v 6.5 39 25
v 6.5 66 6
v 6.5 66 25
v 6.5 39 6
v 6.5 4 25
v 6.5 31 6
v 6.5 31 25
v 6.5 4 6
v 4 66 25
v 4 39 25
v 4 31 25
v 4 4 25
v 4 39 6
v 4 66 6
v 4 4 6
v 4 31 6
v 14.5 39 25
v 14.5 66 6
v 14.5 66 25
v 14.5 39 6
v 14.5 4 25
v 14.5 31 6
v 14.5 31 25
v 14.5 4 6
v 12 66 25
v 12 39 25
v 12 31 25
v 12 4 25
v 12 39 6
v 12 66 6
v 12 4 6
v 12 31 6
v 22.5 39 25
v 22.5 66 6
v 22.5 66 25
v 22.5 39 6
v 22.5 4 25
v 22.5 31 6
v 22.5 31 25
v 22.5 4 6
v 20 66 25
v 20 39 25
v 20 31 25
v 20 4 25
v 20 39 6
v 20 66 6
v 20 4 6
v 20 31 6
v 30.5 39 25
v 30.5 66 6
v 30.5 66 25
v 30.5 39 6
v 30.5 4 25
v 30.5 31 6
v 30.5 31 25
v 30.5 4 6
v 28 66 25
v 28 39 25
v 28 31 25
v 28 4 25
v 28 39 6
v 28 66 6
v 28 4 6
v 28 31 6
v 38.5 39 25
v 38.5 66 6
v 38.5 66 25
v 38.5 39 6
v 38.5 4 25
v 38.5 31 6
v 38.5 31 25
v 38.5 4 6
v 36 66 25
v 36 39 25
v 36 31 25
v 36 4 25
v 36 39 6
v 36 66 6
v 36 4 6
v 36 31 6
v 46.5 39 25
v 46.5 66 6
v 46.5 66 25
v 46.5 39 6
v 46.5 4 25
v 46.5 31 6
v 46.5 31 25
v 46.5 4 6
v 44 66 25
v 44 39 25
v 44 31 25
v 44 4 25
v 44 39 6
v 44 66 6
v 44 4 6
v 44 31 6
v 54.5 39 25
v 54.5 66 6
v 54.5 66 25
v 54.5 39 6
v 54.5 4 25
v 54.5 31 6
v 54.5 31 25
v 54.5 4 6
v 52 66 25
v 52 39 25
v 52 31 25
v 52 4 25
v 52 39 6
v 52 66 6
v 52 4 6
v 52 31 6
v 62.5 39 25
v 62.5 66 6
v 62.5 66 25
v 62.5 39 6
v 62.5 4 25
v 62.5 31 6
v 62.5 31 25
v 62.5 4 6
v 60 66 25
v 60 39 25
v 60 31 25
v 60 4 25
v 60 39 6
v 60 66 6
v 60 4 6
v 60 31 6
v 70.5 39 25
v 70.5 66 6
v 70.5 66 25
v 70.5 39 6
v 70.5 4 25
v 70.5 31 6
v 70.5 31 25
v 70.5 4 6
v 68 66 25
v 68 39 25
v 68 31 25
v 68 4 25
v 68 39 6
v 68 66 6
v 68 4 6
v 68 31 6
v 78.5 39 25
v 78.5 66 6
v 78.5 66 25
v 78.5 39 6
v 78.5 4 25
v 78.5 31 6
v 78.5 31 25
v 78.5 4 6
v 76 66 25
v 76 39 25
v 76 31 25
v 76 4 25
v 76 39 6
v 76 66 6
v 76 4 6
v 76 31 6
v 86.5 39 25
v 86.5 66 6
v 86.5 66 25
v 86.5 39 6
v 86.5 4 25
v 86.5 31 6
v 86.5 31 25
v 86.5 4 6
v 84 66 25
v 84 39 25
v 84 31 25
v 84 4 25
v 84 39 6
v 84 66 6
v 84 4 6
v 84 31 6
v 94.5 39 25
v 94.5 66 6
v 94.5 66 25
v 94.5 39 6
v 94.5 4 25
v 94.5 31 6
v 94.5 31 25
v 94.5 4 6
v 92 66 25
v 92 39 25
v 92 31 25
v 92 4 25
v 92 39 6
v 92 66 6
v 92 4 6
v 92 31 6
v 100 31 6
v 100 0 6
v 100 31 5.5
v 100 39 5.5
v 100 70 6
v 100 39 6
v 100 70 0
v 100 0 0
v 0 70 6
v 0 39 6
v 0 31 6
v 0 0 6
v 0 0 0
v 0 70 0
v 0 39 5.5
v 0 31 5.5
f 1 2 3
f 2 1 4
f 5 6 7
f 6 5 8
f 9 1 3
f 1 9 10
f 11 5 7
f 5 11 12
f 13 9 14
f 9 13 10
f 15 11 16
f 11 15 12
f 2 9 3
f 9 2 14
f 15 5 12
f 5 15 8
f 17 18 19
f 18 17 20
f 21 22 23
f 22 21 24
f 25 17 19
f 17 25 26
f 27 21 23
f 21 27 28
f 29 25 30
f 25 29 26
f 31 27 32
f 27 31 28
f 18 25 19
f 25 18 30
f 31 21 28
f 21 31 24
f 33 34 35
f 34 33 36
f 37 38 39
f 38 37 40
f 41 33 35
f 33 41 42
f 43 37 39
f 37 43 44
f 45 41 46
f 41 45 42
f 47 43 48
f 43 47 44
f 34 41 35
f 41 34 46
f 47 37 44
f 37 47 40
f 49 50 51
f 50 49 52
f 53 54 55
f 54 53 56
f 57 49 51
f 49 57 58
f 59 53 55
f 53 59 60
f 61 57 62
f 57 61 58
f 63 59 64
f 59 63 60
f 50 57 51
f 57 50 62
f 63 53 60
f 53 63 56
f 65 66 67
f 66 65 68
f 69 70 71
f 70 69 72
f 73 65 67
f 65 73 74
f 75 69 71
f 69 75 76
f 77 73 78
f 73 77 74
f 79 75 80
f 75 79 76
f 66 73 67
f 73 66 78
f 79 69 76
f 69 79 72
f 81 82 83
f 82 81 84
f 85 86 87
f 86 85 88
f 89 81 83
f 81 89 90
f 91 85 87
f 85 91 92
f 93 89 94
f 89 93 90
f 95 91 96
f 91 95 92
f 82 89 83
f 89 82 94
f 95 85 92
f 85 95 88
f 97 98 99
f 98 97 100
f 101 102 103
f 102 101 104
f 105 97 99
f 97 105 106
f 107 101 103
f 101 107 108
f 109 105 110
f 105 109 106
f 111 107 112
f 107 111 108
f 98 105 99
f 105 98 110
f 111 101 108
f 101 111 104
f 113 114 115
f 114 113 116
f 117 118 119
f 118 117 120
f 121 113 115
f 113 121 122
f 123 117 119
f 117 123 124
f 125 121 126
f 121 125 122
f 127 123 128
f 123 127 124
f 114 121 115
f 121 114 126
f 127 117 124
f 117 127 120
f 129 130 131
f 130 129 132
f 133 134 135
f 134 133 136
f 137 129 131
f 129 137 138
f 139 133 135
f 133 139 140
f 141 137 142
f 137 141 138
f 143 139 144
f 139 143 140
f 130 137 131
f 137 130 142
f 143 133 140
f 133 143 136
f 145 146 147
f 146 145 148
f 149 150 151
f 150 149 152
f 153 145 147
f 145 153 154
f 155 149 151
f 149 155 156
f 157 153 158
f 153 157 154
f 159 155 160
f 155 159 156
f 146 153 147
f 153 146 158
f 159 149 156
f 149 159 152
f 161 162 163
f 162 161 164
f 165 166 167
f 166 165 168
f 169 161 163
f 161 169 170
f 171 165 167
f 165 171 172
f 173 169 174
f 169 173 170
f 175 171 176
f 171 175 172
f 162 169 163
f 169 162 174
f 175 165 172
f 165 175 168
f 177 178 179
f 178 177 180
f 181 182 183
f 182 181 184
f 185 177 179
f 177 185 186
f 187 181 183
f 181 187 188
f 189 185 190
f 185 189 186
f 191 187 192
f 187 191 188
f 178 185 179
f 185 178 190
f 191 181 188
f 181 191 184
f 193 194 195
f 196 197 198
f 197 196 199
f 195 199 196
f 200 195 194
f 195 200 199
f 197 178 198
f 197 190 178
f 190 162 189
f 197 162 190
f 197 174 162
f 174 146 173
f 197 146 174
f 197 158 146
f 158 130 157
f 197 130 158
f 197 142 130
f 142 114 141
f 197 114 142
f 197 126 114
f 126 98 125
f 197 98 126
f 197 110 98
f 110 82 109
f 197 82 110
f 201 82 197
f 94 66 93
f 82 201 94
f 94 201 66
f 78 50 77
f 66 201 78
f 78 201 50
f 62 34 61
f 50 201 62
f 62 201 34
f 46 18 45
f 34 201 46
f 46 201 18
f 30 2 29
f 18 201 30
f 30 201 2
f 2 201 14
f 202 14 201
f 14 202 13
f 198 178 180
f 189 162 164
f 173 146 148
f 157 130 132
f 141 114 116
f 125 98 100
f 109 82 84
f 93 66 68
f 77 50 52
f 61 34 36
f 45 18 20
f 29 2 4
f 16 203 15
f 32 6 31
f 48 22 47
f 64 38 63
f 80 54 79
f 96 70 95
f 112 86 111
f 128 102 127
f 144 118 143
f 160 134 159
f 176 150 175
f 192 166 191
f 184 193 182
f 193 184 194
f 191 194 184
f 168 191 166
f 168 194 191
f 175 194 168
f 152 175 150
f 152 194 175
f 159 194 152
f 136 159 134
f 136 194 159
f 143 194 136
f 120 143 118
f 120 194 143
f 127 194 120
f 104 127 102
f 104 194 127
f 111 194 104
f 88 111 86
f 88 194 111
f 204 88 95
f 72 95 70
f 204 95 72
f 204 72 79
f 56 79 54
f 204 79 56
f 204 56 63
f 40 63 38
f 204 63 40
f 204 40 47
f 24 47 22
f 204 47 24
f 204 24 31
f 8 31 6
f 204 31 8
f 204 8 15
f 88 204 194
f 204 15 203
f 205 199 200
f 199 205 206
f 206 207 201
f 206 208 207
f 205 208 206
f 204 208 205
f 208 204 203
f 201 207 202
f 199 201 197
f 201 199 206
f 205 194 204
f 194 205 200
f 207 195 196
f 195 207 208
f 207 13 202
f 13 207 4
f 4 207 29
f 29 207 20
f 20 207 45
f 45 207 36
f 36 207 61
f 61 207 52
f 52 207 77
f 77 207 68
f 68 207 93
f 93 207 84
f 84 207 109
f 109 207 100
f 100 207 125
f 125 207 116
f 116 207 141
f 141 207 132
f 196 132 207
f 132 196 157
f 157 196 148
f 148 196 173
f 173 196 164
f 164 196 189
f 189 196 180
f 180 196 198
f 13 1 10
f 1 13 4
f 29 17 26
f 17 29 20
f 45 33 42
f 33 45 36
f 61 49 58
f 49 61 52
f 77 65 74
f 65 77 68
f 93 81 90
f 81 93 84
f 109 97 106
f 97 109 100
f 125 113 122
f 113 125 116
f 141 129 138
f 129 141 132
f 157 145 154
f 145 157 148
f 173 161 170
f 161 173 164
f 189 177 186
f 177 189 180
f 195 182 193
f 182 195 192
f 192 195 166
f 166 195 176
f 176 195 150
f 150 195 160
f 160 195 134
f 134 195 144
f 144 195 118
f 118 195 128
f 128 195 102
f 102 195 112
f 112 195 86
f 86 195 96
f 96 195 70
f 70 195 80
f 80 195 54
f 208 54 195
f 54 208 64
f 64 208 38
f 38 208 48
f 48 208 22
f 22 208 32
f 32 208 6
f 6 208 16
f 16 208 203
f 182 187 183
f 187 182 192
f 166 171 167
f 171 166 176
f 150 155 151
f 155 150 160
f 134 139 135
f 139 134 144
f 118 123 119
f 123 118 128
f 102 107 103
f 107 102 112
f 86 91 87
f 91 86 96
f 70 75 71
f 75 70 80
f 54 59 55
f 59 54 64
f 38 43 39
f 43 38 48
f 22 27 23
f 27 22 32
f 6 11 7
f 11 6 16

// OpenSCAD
$fn = 32;

// ----------------------------------------------------------------------
// Heatsink: slotted fin block
// ----------------------------------------------------------------------

// --- parameters (mm) ---
base_l = 100;             // base length, X
base_w = 70;              // base width, Y
base_t = 6;               // base plate thickness
fin_h = 20;               // fin height above the base
fin_t = 2.5;              // fin thickness
edge = 4;                 // margin from the base ends
pitch = 8;                // fin pitch
slot_w = 8;               // central slot width, Y

n_fins = floor((base_l - 2 * edge - fin_t) / pitch) + 1;  // fin count
total_h = base_t + fin_h - 1;  // overall height

difference() {
union() {
  cube([base_l, base_w, base_t]);
  for (i = [0 : n_fins - 1])
    translate([edge + i * pitch, edge, base_t - 1])
      cube([fin_t, base_w - 2 * edge, fin_h]);
}
  translate([-1, base_w / 2 - slot_w / 2, base_t - 0.5])
    cube([base_l + 2, slot_w, fin_h + 2]);
}
